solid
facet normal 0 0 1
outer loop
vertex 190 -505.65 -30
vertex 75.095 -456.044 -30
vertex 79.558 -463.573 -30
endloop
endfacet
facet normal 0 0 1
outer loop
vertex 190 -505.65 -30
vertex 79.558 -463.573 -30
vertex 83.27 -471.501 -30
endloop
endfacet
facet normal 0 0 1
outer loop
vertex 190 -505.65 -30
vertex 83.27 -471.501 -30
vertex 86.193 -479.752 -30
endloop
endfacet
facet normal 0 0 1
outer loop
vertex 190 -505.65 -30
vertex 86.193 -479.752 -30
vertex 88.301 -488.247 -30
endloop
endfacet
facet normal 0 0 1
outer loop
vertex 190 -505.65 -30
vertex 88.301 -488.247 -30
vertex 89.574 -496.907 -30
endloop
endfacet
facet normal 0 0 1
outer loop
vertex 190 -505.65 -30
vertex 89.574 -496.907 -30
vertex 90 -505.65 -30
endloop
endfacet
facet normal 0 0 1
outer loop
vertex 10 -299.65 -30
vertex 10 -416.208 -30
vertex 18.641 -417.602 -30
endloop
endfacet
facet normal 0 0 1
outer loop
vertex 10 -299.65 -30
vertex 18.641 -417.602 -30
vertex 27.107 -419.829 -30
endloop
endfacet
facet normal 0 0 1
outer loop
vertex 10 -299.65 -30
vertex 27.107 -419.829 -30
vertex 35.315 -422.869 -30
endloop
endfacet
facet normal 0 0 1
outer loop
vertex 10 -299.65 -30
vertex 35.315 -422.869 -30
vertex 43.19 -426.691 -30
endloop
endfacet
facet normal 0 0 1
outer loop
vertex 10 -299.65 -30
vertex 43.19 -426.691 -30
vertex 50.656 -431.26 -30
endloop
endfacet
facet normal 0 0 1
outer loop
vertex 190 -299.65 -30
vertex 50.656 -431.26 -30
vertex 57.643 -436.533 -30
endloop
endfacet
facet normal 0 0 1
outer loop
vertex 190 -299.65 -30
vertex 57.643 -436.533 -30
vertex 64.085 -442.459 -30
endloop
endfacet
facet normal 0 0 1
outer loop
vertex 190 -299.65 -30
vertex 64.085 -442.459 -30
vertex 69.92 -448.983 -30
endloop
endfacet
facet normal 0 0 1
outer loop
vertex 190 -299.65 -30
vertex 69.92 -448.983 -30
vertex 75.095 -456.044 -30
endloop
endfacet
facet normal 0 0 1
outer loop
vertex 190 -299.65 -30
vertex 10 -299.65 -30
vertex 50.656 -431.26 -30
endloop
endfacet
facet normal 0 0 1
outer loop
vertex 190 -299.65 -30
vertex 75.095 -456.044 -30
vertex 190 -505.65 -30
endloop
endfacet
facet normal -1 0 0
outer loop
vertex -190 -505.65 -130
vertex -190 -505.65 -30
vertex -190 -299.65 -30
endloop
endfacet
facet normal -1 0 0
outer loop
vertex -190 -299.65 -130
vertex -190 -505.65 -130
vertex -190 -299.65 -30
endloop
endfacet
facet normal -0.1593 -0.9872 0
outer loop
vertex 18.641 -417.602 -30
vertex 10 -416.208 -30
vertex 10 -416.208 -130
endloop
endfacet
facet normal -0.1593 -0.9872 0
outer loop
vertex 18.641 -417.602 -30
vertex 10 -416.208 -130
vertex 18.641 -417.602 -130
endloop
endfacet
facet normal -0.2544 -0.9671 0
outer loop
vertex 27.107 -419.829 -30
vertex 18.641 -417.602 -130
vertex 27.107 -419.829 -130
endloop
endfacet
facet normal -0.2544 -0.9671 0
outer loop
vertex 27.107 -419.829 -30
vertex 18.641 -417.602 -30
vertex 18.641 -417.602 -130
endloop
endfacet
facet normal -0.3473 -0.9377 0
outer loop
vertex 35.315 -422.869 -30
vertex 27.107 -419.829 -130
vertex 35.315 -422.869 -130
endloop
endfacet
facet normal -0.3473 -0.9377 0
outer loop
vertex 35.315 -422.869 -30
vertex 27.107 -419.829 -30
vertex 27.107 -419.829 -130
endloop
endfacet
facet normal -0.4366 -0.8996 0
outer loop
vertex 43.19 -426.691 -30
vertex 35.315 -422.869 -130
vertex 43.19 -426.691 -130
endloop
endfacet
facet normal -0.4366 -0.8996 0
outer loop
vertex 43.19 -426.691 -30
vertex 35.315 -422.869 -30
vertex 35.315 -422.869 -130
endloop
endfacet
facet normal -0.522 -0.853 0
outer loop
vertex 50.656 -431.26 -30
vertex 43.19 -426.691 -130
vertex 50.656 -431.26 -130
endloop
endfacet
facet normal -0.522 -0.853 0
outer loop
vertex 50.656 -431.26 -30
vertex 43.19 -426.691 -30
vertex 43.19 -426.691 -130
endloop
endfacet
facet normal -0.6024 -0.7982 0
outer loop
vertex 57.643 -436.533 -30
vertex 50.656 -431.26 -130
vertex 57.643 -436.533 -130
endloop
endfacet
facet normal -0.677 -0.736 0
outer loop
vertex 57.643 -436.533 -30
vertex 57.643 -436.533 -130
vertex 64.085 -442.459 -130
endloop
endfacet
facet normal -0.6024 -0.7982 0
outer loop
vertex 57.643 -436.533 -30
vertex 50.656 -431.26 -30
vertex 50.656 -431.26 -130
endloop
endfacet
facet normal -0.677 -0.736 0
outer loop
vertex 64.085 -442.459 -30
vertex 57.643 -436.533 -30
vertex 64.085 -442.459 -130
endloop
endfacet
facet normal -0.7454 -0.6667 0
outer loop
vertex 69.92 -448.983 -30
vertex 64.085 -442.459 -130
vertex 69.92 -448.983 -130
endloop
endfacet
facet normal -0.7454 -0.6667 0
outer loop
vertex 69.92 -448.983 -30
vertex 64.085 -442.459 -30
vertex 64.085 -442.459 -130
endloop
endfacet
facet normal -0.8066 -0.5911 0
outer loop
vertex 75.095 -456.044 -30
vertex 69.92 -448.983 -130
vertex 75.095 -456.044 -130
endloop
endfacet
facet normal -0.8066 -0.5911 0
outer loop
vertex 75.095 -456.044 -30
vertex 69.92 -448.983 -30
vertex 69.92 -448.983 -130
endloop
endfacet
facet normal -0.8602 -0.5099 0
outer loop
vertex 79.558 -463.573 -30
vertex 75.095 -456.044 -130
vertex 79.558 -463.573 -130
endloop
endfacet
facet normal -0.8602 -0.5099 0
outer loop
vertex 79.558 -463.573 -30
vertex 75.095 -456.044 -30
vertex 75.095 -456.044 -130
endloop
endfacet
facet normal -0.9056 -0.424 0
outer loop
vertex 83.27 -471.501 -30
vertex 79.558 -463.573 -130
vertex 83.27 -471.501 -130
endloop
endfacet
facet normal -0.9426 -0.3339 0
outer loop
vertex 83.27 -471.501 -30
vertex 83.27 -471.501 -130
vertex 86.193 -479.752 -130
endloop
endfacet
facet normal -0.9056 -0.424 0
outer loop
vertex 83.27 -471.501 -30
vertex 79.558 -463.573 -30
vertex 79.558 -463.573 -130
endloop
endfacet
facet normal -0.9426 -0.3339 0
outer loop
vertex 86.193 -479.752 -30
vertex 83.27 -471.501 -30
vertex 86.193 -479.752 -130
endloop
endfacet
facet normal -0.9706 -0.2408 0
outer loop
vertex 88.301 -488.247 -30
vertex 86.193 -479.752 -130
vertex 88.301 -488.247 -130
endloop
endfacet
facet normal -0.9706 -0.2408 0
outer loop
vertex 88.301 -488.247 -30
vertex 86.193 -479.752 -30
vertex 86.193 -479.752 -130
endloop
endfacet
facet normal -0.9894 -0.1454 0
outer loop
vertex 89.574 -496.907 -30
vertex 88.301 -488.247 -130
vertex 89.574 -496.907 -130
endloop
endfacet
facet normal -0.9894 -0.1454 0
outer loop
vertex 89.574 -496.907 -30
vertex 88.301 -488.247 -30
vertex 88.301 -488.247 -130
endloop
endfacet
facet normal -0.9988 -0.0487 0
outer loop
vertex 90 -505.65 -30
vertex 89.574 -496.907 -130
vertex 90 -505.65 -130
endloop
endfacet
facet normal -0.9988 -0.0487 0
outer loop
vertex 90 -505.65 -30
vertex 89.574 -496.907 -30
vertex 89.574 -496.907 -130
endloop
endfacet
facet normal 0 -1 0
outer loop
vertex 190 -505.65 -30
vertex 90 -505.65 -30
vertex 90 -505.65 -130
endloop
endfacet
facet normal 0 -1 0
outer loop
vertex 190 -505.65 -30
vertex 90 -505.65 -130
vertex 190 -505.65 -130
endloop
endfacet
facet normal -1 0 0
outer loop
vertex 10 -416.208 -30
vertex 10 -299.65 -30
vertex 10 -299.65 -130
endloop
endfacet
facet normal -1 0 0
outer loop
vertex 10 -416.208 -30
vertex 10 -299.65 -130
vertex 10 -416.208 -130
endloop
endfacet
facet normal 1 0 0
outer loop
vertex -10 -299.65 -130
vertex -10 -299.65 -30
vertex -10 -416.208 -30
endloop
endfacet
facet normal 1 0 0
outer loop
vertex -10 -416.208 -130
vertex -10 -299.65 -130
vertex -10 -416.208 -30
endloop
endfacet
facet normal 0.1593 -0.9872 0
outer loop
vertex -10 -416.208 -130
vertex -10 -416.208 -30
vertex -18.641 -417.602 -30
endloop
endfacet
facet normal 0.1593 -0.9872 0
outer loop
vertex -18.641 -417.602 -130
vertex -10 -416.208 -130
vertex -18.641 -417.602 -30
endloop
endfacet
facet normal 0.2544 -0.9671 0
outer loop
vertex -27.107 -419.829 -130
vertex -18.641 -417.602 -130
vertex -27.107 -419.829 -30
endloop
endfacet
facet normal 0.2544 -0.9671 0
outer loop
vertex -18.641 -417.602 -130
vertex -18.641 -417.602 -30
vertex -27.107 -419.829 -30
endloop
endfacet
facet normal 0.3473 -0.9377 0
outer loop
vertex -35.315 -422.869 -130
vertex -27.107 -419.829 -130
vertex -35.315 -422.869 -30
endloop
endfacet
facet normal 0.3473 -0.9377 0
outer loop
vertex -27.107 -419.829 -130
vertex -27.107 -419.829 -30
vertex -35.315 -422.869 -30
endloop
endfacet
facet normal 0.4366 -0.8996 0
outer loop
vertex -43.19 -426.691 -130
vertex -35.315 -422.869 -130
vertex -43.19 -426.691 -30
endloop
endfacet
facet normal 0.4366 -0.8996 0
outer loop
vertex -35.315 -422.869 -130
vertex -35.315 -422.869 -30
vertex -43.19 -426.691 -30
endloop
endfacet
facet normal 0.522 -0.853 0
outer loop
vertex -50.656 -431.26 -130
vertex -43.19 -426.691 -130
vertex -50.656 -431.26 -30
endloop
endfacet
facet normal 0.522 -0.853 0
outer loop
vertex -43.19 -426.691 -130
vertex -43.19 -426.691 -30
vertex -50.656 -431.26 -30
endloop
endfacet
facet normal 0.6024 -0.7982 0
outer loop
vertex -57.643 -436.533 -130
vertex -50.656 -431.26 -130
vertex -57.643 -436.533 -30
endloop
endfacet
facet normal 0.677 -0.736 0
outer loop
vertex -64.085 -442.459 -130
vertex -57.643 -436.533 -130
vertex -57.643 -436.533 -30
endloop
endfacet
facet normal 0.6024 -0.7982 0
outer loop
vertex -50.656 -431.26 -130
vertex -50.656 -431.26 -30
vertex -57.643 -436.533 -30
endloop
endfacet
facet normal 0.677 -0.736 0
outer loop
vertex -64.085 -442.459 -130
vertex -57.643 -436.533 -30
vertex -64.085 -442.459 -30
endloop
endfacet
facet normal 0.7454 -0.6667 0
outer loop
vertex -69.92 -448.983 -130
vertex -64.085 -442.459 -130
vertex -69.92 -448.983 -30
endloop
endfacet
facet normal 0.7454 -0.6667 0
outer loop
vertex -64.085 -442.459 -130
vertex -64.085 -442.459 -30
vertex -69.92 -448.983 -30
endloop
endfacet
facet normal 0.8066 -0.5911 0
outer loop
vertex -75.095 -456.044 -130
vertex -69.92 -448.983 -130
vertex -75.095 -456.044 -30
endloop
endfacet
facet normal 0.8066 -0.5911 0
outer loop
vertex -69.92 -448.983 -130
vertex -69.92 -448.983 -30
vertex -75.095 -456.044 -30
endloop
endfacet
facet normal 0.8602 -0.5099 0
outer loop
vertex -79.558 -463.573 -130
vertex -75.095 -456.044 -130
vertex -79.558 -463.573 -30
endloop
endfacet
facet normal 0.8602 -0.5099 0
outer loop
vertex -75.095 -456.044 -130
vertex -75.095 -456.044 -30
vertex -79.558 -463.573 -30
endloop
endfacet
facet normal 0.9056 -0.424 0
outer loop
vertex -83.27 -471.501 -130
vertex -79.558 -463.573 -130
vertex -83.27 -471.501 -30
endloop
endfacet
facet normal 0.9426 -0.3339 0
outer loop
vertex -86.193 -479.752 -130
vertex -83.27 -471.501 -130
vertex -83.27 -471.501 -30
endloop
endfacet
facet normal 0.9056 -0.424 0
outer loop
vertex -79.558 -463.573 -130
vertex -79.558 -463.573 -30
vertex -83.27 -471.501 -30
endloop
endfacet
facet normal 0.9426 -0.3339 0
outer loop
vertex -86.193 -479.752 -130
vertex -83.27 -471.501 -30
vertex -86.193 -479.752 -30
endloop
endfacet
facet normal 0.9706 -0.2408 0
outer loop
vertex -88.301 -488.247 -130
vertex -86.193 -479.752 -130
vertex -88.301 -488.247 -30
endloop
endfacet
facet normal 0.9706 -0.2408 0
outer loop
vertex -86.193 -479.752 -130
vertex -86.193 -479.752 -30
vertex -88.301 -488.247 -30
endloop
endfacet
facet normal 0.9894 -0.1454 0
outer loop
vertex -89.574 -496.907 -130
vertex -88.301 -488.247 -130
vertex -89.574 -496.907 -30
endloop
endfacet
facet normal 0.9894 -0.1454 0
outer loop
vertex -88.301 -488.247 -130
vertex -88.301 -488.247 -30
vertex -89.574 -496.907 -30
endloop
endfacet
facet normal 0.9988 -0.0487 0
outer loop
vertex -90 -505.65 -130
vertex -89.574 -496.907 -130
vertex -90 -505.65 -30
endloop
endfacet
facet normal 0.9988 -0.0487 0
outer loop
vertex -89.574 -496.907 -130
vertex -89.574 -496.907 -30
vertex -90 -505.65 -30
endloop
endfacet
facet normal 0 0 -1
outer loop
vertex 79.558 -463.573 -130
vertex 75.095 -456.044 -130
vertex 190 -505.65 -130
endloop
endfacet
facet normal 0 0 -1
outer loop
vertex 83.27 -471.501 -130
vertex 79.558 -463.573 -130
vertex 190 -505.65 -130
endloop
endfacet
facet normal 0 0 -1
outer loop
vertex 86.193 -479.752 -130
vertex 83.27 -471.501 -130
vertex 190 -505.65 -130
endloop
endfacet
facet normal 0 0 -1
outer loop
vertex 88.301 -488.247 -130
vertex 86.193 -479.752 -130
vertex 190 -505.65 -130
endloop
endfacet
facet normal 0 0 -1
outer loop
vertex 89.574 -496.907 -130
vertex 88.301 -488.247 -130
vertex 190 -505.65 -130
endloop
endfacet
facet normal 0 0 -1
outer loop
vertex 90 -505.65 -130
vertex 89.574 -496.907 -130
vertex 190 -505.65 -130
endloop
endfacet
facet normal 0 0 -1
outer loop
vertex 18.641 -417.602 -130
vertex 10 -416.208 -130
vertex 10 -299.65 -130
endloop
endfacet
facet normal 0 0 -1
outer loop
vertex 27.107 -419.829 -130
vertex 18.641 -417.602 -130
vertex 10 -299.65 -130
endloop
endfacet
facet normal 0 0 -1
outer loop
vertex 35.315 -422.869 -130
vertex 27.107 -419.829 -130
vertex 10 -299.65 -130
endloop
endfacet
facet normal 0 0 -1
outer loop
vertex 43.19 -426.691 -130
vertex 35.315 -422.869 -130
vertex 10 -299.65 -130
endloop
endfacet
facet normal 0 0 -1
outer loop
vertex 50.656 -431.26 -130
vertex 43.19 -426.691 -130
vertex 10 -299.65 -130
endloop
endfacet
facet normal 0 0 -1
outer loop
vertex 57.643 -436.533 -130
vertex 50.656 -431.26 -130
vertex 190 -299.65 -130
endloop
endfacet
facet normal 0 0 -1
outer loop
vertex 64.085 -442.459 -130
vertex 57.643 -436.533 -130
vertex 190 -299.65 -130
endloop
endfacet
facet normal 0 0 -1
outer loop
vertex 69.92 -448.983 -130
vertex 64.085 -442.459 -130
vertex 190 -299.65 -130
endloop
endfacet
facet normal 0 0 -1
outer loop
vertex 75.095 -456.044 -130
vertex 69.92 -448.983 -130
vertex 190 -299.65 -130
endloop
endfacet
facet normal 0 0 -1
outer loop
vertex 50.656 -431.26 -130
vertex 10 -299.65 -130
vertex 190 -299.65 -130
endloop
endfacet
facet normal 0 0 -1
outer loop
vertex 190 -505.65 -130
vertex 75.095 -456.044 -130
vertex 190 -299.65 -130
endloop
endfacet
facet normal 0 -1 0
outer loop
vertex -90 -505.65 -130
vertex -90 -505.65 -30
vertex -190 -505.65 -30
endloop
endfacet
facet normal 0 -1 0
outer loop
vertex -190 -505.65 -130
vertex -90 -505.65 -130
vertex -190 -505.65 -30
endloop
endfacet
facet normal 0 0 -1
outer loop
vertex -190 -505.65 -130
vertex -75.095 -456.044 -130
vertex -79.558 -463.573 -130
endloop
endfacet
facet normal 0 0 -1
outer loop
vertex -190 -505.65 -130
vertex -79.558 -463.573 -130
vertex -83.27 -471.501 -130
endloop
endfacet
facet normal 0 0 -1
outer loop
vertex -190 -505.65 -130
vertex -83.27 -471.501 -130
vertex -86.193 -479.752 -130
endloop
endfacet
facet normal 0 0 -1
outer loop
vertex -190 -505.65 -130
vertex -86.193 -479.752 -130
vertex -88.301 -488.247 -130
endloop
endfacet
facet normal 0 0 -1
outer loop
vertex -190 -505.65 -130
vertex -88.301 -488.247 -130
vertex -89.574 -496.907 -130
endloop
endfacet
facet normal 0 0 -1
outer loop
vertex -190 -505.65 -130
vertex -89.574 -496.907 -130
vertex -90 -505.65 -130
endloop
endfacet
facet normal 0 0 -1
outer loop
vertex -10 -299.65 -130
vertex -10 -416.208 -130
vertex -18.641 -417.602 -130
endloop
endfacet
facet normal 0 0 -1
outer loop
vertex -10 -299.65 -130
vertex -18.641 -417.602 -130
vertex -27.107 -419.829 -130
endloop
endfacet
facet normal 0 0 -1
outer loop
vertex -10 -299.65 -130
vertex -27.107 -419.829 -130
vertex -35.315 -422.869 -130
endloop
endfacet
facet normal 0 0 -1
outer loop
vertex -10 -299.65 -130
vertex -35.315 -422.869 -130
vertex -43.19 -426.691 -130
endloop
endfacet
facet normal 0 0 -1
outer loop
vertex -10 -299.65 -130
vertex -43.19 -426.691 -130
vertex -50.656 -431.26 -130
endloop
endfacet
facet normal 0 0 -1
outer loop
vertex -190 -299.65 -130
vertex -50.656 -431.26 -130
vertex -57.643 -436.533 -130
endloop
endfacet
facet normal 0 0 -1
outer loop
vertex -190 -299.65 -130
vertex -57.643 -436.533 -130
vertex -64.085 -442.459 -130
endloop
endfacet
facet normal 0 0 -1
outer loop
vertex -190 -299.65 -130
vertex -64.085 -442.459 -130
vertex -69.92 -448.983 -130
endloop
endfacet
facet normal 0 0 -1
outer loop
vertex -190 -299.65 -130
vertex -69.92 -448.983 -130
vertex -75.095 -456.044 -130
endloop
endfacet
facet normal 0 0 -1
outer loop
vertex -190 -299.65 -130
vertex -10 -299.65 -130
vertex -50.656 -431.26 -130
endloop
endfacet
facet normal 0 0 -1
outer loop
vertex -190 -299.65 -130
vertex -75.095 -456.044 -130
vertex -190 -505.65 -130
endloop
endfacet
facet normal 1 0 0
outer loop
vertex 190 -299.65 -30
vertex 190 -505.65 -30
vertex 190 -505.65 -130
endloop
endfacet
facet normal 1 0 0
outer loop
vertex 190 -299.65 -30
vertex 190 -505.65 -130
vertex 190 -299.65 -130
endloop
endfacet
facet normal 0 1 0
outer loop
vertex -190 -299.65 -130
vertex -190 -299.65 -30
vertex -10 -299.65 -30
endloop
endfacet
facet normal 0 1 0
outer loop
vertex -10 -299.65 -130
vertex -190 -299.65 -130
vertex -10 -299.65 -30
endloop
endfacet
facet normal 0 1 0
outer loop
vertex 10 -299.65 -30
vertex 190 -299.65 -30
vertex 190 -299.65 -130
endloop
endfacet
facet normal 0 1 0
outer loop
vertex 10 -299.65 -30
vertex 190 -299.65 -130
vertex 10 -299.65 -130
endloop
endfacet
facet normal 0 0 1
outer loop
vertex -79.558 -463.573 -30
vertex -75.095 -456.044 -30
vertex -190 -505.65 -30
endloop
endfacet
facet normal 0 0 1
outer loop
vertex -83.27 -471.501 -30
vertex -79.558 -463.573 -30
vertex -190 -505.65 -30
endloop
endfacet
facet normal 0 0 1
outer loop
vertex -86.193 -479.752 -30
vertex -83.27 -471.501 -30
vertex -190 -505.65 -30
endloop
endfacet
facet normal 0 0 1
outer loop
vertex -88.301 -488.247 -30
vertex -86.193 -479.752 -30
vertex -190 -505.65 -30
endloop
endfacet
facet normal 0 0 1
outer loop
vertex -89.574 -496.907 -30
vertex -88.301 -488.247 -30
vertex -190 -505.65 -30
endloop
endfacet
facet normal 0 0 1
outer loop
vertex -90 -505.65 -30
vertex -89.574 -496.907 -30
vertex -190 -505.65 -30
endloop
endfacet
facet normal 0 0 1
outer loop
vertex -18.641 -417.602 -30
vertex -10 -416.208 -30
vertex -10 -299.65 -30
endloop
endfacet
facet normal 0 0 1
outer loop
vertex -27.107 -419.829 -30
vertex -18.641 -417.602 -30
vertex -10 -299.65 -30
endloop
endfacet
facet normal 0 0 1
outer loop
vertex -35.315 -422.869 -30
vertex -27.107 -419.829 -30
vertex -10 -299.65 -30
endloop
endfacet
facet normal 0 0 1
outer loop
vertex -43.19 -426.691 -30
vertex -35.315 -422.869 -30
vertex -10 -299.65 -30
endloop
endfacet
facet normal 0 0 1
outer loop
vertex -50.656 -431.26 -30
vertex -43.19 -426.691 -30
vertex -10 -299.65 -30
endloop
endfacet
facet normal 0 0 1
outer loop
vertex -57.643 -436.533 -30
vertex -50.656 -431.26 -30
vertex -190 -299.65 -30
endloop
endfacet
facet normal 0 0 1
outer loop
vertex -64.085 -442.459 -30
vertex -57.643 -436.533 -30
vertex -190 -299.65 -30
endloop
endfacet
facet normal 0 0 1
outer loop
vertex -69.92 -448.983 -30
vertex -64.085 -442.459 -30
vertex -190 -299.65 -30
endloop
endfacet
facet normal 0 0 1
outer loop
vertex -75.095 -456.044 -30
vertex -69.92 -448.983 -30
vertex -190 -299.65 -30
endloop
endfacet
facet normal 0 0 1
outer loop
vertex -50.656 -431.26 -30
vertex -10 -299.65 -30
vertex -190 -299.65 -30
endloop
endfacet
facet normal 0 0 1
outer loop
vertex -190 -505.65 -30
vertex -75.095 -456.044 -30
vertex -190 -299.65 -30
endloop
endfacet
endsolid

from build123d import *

# Parameters (mm, degrees)
BOSS_EXTRUDE1_START = -30
BOSS_EXTRUDE1_DEPTH = 100


with BuildPart() as part:
    # Sketch2 → Boss-Extrude1 (new body)
    with BuildSketch(Plane.XY.offset(BOSS_EXTRUDE1_START)):
        with BuildLine():
            Line((90, -505.650336196), (190, -505.650336196))
            Line((190, -505.650336196), (190, -299.650336196))
            Line((190, -299.650336196), (10, -299.650336196))
            Line((10, -299.650336196), (10, -416.207617096))
            ThreePointArc((10, -416.207617096), (67.082039325, -445.650336196), (90, -505.650336196))
        make_face()
    extrude(amount=-BOSS_EXTRUDE1_DEPTH)


with BuildPart() as body_2:
    # Mirror3: mirrored copy
    add(part.part.mirror(Plane(origin=(0, 0, 0), x_dir=(0, 0, 1), z_dir=(1, 0, 0))))


solid = Compound([part.part, body_2.part])
